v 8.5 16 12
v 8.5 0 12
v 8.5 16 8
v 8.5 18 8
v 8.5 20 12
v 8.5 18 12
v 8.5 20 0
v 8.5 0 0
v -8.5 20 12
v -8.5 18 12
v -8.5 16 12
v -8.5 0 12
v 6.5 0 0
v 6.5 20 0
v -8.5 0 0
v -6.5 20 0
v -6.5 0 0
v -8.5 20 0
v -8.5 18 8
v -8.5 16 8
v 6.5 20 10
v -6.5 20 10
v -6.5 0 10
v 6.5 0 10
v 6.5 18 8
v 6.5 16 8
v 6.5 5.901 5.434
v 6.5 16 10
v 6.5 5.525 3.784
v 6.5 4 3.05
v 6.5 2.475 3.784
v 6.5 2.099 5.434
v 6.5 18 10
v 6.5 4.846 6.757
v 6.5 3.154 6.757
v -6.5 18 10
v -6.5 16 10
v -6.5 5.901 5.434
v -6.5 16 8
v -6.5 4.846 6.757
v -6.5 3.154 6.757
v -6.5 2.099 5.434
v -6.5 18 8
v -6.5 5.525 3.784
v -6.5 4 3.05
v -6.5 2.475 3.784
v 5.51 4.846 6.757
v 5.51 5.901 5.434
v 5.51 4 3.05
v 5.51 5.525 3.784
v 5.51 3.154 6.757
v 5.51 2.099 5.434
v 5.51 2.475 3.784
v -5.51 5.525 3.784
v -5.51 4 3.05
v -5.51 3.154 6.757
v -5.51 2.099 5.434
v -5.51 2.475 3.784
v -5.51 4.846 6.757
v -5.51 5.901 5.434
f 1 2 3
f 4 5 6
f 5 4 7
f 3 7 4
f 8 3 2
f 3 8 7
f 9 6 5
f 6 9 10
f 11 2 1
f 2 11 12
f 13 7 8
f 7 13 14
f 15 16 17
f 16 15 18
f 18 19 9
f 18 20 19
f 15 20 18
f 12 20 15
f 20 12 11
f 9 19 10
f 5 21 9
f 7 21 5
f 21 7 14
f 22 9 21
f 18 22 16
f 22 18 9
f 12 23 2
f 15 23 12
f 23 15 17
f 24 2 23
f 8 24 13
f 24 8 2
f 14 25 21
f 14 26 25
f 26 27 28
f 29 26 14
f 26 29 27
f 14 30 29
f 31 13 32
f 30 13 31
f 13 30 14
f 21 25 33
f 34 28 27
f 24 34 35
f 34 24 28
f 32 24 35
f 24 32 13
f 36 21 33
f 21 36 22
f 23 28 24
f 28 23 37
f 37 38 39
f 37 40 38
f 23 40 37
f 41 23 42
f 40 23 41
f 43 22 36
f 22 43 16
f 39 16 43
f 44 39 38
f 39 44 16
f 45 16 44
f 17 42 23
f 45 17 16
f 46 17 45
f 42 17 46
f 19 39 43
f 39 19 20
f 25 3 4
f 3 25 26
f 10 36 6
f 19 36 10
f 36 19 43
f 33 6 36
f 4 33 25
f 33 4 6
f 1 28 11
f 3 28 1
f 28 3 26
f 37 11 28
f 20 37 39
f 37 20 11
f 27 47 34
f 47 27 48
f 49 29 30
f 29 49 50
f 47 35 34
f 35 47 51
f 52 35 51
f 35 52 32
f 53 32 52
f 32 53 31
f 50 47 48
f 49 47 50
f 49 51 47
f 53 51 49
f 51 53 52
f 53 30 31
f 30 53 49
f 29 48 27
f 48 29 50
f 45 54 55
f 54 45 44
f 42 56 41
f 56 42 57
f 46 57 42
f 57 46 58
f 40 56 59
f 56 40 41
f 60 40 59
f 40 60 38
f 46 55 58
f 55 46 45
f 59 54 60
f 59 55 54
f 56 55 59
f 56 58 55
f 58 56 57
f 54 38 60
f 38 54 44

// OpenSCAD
// 13 wide
// 3.9 post
// 10 tall

w1 = 13;
w2 = w1 + 4;
h1 = 10;
h2 = 12;

difference() {
  translate([-w2/2,0,0]) cube([w2,20,h2]);
  translate([-w1/2,-1,-1]) cube([w1,30,h1+1]);
  translate([-50,16,8]) cube([100,2,100]);
}

for(x_scale=[1,-1]) 
    scale([x_scale,1,1]) 
translate([w1/2-0.99,4,5]) rotate([0,90,0]) cylinder(d=3.9,h=1);
